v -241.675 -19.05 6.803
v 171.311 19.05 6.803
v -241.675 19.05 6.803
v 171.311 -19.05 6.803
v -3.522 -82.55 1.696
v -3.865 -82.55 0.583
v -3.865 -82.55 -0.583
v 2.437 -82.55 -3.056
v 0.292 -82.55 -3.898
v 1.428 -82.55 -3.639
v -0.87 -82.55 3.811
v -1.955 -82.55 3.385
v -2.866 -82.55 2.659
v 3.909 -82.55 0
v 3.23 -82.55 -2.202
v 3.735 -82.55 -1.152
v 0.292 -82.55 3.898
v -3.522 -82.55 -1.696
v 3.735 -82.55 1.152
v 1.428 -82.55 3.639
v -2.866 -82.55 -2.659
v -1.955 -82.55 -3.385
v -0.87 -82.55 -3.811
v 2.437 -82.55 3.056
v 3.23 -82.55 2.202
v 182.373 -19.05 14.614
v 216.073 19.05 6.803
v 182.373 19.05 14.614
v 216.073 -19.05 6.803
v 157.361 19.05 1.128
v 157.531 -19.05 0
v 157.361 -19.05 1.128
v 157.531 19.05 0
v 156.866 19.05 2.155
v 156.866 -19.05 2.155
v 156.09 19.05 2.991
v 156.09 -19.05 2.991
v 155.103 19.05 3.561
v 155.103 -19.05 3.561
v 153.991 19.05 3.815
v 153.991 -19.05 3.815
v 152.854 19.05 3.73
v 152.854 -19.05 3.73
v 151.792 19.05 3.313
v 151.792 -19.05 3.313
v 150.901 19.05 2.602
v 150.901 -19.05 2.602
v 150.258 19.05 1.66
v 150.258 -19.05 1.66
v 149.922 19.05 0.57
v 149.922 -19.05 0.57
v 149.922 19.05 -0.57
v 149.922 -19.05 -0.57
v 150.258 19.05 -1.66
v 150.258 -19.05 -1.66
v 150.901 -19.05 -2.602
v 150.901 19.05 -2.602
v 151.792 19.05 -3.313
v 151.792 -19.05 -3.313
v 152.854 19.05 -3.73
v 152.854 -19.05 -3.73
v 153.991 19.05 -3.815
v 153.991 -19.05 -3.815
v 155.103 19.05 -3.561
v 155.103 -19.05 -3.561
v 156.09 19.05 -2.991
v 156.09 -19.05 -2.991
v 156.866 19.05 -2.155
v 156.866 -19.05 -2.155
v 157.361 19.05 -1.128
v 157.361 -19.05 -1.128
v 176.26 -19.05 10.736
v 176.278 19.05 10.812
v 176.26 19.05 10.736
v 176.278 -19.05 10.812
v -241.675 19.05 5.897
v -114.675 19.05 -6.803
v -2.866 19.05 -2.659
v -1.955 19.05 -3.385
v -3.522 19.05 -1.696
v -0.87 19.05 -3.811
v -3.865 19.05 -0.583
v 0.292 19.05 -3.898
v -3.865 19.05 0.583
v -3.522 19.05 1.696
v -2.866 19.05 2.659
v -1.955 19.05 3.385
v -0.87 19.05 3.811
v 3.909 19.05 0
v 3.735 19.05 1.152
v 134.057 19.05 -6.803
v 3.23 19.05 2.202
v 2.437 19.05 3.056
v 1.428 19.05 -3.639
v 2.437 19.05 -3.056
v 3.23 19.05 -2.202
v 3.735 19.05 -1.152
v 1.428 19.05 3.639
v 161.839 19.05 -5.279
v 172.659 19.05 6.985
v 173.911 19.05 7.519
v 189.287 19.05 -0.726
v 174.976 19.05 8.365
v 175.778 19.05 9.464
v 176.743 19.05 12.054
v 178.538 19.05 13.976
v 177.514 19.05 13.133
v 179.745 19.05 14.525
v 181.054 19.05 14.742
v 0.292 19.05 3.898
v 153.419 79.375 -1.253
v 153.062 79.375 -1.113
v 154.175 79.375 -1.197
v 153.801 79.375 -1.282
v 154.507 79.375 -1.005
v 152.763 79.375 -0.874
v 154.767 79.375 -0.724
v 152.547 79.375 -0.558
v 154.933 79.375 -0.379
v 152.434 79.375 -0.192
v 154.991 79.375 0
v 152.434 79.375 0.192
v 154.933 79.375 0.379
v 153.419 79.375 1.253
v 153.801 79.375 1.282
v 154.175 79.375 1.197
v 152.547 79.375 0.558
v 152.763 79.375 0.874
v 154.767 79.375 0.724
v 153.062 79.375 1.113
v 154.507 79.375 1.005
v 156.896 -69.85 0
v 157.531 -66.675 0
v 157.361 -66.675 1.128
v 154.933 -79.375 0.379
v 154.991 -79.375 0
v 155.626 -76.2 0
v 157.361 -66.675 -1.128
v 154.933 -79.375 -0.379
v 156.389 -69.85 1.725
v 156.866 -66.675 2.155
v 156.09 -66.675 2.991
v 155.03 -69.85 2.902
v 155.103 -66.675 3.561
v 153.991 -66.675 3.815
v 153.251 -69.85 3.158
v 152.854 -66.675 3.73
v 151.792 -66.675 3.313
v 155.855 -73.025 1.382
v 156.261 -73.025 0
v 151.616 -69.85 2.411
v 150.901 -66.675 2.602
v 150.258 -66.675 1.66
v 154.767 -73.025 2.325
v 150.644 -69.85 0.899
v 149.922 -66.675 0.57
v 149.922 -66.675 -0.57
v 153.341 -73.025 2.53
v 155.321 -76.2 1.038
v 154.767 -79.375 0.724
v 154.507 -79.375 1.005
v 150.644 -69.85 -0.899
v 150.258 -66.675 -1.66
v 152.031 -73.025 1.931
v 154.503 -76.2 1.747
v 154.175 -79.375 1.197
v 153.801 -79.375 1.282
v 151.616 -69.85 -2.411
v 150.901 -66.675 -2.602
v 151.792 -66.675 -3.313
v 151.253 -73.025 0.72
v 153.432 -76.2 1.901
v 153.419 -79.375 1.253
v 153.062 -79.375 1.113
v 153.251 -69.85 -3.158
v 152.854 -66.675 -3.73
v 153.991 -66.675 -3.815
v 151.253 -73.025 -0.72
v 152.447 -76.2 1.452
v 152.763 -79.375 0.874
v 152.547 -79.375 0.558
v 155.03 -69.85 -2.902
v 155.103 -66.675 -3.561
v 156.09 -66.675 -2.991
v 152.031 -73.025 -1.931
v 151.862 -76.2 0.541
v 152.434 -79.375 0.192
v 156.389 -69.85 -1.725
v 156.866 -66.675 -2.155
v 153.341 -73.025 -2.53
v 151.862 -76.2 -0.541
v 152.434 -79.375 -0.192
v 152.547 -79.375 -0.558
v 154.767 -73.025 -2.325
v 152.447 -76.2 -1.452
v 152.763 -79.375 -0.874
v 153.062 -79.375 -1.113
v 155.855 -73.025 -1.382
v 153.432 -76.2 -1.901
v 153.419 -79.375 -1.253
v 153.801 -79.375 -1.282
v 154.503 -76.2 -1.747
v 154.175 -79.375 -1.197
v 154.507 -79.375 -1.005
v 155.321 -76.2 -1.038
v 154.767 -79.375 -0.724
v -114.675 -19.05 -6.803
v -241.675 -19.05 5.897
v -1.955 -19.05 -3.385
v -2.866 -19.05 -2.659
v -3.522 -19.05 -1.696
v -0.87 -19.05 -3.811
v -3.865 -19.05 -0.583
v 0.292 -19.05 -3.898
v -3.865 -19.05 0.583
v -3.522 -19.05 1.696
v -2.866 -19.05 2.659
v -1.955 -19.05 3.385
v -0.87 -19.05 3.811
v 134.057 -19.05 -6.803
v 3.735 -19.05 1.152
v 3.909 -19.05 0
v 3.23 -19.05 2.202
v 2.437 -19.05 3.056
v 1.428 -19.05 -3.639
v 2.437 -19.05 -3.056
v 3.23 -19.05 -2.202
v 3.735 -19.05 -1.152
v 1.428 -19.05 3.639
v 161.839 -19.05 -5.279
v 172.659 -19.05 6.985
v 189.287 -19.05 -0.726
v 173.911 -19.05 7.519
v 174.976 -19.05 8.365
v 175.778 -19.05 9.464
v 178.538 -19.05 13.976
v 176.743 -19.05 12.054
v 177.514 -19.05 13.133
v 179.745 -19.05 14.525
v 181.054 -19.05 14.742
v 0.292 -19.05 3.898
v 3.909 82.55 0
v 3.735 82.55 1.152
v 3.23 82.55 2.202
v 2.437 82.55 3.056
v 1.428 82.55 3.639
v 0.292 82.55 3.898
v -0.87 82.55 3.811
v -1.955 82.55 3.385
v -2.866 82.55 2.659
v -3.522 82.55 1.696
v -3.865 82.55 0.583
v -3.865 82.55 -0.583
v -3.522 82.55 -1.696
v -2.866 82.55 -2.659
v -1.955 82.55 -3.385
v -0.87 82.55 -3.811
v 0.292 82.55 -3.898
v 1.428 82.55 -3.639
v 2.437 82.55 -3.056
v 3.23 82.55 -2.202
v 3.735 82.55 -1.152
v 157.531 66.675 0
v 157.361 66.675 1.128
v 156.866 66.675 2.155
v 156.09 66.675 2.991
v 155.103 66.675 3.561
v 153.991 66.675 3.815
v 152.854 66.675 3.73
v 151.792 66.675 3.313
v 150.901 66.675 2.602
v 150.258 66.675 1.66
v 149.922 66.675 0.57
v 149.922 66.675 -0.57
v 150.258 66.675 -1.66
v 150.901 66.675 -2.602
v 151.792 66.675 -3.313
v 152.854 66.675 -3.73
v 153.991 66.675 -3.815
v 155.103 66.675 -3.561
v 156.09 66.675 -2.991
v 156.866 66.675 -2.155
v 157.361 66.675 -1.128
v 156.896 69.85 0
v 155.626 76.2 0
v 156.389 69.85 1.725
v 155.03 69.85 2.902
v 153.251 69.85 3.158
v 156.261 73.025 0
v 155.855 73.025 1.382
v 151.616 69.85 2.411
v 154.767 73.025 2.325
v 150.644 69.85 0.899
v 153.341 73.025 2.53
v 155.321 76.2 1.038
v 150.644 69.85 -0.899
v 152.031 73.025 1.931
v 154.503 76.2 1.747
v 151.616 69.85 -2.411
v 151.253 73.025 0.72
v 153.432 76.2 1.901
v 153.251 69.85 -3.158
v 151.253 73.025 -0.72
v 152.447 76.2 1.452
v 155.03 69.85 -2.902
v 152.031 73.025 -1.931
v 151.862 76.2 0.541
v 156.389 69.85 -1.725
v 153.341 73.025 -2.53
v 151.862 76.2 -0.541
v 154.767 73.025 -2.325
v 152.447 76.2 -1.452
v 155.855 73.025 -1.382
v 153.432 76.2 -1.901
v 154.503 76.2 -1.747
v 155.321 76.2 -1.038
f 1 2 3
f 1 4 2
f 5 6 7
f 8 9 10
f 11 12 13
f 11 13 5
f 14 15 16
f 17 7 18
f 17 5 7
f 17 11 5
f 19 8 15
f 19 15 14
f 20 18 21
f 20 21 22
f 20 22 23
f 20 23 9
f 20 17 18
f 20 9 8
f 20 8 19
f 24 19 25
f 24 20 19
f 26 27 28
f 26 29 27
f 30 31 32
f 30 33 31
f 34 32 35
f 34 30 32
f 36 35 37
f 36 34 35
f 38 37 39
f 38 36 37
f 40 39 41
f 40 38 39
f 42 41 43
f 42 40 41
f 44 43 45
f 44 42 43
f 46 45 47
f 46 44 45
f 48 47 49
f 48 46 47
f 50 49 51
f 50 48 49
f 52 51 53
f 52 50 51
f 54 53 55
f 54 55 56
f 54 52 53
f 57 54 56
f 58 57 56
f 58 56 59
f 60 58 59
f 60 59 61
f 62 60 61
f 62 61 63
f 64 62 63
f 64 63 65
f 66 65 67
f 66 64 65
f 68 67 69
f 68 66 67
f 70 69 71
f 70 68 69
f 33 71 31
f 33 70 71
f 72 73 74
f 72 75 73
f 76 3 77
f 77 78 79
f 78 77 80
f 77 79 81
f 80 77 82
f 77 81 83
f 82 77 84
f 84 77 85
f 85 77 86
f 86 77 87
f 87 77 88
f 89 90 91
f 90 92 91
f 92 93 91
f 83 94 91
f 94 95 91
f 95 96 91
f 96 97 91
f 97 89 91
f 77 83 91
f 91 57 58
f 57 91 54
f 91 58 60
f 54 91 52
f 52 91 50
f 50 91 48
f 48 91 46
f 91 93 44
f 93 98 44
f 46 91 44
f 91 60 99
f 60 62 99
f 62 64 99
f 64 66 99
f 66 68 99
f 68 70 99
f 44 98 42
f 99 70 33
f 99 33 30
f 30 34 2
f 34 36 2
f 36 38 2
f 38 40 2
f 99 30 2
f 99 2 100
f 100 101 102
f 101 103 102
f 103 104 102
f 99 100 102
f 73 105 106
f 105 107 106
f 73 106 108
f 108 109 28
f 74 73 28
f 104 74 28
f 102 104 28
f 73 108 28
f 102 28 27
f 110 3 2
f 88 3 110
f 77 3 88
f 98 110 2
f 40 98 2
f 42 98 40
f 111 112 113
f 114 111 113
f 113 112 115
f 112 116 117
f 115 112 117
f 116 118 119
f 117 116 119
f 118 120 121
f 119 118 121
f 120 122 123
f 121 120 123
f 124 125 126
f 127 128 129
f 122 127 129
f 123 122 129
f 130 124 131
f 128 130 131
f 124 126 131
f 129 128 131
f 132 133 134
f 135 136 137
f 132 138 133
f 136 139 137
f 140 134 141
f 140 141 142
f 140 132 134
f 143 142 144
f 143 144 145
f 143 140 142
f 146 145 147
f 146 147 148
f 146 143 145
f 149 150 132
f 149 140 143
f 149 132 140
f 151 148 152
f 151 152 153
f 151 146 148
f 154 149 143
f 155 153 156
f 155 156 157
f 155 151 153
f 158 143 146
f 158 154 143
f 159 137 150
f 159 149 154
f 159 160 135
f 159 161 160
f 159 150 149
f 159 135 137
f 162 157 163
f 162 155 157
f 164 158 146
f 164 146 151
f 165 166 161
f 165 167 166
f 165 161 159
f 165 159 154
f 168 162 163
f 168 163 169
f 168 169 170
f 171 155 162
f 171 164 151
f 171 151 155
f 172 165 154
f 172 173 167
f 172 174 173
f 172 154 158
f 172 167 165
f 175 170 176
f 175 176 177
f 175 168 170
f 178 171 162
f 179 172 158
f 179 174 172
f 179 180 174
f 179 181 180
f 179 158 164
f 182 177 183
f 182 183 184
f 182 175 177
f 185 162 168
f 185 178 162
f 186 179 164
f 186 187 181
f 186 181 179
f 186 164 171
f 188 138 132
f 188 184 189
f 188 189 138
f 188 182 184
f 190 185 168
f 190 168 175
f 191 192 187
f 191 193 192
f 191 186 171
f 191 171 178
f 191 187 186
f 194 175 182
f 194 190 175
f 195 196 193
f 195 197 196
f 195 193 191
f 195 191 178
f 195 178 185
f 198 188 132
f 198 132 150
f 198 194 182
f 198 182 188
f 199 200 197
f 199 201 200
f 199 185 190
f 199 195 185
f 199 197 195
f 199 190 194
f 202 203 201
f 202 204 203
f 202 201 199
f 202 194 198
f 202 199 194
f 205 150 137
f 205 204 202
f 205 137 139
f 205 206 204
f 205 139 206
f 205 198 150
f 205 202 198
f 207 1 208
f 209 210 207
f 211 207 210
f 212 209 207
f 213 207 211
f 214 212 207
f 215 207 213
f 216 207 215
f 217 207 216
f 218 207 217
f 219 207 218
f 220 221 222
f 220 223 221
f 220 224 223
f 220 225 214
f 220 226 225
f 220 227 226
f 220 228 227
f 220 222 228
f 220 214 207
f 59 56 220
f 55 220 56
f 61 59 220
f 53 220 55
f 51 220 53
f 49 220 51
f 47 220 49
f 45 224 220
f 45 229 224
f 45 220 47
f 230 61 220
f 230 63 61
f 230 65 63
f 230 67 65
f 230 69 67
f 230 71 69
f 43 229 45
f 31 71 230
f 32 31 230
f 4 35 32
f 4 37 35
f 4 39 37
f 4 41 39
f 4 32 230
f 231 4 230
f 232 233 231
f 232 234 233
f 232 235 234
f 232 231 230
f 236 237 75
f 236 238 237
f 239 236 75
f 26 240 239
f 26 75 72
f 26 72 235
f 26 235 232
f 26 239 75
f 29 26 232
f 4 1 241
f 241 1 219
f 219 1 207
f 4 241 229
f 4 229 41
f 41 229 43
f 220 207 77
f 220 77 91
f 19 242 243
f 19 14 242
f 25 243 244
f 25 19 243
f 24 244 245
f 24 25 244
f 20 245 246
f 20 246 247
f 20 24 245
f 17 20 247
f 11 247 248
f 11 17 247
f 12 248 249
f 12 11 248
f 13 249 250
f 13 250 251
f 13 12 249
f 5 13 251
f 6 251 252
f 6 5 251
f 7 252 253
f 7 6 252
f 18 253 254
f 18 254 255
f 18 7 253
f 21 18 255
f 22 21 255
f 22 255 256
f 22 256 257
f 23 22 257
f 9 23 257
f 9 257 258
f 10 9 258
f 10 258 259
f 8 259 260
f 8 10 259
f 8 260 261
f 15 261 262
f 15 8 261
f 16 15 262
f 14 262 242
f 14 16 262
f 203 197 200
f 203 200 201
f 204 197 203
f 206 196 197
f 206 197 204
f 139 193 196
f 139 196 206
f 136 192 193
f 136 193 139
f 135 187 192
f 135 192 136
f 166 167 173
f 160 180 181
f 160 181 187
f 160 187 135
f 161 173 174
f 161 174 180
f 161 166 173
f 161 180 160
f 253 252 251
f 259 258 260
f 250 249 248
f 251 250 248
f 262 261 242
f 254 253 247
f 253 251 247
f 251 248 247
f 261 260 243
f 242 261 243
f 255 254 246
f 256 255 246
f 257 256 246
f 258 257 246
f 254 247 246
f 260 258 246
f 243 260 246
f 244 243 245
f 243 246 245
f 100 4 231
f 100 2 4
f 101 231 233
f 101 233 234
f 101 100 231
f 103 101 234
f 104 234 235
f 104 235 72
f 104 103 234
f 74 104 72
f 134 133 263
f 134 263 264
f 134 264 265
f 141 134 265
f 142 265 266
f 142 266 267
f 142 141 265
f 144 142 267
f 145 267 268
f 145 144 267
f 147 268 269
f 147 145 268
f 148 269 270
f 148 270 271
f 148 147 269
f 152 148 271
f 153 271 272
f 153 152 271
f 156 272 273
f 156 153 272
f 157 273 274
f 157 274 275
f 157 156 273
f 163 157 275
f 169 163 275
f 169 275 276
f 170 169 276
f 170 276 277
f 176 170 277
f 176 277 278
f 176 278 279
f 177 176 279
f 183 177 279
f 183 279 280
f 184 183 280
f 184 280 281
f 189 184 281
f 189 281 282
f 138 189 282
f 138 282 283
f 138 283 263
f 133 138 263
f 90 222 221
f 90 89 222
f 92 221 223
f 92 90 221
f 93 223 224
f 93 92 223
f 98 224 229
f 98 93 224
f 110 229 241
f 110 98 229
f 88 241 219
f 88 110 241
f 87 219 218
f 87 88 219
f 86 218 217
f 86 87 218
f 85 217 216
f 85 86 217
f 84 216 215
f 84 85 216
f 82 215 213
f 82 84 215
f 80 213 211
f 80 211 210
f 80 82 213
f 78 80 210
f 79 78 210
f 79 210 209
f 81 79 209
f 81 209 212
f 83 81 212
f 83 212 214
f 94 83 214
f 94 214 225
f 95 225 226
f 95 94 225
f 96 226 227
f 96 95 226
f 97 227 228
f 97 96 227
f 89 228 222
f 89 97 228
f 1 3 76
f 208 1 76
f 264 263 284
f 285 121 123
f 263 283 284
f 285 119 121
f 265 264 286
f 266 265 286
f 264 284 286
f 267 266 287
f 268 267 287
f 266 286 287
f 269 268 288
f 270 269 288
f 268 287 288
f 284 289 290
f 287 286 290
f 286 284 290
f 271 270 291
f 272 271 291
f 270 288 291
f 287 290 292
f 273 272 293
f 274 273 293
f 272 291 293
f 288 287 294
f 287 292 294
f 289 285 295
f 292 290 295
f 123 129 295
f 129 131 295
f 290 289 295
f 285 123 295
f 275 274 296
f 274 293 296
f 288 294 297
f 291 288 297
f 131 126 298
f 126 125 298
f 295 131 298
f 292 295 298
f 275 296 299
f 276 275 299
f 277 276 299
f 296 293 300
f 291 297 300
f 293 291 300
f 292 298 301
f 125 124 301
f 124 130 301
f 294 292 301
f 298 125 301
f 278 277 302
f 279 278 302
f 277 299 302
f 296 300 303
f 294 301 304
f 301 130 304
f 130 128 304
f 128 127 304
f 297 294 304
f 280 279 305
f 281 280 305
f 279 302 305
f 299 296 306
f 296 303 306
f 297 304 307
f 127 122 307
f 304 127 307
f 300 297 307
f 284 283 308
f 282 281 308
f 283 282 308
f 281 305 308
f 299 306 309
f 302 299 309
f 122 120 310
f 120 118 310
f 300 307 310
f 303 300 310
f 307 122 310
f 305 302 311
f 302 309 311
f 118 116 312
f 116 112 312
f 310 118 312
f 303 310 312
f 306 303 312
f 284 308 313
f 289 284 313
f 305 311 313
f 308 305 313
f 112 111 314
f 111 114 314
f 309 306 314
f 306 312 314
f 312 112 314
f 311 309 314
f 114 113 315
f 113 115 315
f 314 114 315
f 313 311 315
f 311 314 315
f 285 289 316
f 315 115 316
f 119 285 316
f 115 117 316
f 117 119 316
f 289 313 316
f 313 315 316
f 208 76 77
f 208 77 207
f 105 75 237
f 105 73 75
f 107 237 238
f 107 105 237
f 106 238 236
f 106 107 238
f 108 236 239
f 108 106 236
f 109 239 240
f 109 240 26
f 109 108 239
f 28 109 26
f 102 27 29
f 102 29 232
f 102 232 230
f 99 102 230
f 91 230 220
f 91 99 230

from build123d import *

# Parameters (mm, degrees)
F0_R        = 3.9091582441
F1_DEPTH    = 82.55
F0_R_2      = 3.8256262675
F2_DEPTH    = 79.375
F3_DEPTH    = 19.05
F4_T1_DEPTH = 448.1823504125
F5_R        = 5.08
F6_SIZE2    = 12.7
F6_SIZE     = 127
F7_SIZE2    = 2.54
F7_SIZE     = 12.7


# Not quite as in the source:
# - a fillet or chamfer that OpenCascade refuses, or shapes differently, is made with other operations: its cross-section is extruded or revolved along the edge and cut away or added


with BuildPart() as f1:
    # F0 (on Front) → F1 (new body, symmetric)
    with BuildSketch(Plane.XZ):
        Circle(F0_R)
    extrude(amount=F1_DEPTH, both=True)


with BuildPart() as f2:
    # F0 (on Front) → F2 (new body, symmetric)
    with BuildSketch(Plane.XZ):
        with Locations((153.7049710751, 0)):
            Circle(F0_R_2)
    extrude(amount=F2_DEPTH, both=True)

    # F7
    f7_edges = [f2.edges().sort_by_distance(p)[0] for p in [
        (149.879345, 79.375, 0),
        (149.879345, -79.375, 0),
    ]]
    chamfer(f7_edges, length=F7_SIZE, length2=F7_SIZE2)


with BuildPart() as f3:
    # F0 (on Front) → F3 (new body, symmetric)
    with BuildSketch(Plane.XZ):
        Polygon((-241.6750043631, 6.8029756658), (-241.6750043631, -6.8029756658), (216.0731535405, -6.8029756658), (216.0731535405, 6.8029756658), (175.348284848, 6.8029756658), align=None)
        Circle(F0_R, mode=Mode.SUBTRACT)
        with Locations((153.7049710751, 0)):
            Circle(F0_R_2, mode=Mode.SUBTRACT)
        Polygon((175.348284848, 6.8029756658), (216.0731535405, 6.8029756658), (177.4246394634, 15.7611016184), align=None)
    extrude(amount=F3_DEPTH, both=True)

    # F4: fillet of radius 254 on 1 edges, made by hand

    # F4_s2 → F4_t1 (cut)
    with BuildSketch(Plane.XZ.offset(-224.0911752063)):
        with BuildLine():
            ThreePointArc((216.0731535405, 6.8029756658), (175.6253714227, -3.3784017971), (134.056683458, -6.8029756658))
            Line((134.056683458, -6.8029756658), (216.0731535405, -6.8029756658))
            Line((216.0731535405, -6.8029756658), (216.0731535405, 6.8029756658))
        make_face()
    extrude(amount=F4_T1_DEPTH, mode=Mode.SUBTRACT)

    # F5
    f5_edges = [f3.edges().sort_by_distance(p)[0] for p in [
        (175.348285, 0, 6.802976),
        (177.424639, 0, 15.761102),
    ]]
    fillet(f5_edges, radius=F5_R)

    # F6
    f6_edges = [f3.edges().sort_by_distance(p)[0] for p in [
        (-241.675004, 0, -6.802976),
    ]]
    f6_side = f3.faces().sort_by_distance((-53.80916, 0, -6.802976))[0]
    chamfer(f6_edges, length=F6_SIZE, length2=F6_SIZE2, reference=f6_side)


solid = Compound([f1.part, f2.part, f3.part])
